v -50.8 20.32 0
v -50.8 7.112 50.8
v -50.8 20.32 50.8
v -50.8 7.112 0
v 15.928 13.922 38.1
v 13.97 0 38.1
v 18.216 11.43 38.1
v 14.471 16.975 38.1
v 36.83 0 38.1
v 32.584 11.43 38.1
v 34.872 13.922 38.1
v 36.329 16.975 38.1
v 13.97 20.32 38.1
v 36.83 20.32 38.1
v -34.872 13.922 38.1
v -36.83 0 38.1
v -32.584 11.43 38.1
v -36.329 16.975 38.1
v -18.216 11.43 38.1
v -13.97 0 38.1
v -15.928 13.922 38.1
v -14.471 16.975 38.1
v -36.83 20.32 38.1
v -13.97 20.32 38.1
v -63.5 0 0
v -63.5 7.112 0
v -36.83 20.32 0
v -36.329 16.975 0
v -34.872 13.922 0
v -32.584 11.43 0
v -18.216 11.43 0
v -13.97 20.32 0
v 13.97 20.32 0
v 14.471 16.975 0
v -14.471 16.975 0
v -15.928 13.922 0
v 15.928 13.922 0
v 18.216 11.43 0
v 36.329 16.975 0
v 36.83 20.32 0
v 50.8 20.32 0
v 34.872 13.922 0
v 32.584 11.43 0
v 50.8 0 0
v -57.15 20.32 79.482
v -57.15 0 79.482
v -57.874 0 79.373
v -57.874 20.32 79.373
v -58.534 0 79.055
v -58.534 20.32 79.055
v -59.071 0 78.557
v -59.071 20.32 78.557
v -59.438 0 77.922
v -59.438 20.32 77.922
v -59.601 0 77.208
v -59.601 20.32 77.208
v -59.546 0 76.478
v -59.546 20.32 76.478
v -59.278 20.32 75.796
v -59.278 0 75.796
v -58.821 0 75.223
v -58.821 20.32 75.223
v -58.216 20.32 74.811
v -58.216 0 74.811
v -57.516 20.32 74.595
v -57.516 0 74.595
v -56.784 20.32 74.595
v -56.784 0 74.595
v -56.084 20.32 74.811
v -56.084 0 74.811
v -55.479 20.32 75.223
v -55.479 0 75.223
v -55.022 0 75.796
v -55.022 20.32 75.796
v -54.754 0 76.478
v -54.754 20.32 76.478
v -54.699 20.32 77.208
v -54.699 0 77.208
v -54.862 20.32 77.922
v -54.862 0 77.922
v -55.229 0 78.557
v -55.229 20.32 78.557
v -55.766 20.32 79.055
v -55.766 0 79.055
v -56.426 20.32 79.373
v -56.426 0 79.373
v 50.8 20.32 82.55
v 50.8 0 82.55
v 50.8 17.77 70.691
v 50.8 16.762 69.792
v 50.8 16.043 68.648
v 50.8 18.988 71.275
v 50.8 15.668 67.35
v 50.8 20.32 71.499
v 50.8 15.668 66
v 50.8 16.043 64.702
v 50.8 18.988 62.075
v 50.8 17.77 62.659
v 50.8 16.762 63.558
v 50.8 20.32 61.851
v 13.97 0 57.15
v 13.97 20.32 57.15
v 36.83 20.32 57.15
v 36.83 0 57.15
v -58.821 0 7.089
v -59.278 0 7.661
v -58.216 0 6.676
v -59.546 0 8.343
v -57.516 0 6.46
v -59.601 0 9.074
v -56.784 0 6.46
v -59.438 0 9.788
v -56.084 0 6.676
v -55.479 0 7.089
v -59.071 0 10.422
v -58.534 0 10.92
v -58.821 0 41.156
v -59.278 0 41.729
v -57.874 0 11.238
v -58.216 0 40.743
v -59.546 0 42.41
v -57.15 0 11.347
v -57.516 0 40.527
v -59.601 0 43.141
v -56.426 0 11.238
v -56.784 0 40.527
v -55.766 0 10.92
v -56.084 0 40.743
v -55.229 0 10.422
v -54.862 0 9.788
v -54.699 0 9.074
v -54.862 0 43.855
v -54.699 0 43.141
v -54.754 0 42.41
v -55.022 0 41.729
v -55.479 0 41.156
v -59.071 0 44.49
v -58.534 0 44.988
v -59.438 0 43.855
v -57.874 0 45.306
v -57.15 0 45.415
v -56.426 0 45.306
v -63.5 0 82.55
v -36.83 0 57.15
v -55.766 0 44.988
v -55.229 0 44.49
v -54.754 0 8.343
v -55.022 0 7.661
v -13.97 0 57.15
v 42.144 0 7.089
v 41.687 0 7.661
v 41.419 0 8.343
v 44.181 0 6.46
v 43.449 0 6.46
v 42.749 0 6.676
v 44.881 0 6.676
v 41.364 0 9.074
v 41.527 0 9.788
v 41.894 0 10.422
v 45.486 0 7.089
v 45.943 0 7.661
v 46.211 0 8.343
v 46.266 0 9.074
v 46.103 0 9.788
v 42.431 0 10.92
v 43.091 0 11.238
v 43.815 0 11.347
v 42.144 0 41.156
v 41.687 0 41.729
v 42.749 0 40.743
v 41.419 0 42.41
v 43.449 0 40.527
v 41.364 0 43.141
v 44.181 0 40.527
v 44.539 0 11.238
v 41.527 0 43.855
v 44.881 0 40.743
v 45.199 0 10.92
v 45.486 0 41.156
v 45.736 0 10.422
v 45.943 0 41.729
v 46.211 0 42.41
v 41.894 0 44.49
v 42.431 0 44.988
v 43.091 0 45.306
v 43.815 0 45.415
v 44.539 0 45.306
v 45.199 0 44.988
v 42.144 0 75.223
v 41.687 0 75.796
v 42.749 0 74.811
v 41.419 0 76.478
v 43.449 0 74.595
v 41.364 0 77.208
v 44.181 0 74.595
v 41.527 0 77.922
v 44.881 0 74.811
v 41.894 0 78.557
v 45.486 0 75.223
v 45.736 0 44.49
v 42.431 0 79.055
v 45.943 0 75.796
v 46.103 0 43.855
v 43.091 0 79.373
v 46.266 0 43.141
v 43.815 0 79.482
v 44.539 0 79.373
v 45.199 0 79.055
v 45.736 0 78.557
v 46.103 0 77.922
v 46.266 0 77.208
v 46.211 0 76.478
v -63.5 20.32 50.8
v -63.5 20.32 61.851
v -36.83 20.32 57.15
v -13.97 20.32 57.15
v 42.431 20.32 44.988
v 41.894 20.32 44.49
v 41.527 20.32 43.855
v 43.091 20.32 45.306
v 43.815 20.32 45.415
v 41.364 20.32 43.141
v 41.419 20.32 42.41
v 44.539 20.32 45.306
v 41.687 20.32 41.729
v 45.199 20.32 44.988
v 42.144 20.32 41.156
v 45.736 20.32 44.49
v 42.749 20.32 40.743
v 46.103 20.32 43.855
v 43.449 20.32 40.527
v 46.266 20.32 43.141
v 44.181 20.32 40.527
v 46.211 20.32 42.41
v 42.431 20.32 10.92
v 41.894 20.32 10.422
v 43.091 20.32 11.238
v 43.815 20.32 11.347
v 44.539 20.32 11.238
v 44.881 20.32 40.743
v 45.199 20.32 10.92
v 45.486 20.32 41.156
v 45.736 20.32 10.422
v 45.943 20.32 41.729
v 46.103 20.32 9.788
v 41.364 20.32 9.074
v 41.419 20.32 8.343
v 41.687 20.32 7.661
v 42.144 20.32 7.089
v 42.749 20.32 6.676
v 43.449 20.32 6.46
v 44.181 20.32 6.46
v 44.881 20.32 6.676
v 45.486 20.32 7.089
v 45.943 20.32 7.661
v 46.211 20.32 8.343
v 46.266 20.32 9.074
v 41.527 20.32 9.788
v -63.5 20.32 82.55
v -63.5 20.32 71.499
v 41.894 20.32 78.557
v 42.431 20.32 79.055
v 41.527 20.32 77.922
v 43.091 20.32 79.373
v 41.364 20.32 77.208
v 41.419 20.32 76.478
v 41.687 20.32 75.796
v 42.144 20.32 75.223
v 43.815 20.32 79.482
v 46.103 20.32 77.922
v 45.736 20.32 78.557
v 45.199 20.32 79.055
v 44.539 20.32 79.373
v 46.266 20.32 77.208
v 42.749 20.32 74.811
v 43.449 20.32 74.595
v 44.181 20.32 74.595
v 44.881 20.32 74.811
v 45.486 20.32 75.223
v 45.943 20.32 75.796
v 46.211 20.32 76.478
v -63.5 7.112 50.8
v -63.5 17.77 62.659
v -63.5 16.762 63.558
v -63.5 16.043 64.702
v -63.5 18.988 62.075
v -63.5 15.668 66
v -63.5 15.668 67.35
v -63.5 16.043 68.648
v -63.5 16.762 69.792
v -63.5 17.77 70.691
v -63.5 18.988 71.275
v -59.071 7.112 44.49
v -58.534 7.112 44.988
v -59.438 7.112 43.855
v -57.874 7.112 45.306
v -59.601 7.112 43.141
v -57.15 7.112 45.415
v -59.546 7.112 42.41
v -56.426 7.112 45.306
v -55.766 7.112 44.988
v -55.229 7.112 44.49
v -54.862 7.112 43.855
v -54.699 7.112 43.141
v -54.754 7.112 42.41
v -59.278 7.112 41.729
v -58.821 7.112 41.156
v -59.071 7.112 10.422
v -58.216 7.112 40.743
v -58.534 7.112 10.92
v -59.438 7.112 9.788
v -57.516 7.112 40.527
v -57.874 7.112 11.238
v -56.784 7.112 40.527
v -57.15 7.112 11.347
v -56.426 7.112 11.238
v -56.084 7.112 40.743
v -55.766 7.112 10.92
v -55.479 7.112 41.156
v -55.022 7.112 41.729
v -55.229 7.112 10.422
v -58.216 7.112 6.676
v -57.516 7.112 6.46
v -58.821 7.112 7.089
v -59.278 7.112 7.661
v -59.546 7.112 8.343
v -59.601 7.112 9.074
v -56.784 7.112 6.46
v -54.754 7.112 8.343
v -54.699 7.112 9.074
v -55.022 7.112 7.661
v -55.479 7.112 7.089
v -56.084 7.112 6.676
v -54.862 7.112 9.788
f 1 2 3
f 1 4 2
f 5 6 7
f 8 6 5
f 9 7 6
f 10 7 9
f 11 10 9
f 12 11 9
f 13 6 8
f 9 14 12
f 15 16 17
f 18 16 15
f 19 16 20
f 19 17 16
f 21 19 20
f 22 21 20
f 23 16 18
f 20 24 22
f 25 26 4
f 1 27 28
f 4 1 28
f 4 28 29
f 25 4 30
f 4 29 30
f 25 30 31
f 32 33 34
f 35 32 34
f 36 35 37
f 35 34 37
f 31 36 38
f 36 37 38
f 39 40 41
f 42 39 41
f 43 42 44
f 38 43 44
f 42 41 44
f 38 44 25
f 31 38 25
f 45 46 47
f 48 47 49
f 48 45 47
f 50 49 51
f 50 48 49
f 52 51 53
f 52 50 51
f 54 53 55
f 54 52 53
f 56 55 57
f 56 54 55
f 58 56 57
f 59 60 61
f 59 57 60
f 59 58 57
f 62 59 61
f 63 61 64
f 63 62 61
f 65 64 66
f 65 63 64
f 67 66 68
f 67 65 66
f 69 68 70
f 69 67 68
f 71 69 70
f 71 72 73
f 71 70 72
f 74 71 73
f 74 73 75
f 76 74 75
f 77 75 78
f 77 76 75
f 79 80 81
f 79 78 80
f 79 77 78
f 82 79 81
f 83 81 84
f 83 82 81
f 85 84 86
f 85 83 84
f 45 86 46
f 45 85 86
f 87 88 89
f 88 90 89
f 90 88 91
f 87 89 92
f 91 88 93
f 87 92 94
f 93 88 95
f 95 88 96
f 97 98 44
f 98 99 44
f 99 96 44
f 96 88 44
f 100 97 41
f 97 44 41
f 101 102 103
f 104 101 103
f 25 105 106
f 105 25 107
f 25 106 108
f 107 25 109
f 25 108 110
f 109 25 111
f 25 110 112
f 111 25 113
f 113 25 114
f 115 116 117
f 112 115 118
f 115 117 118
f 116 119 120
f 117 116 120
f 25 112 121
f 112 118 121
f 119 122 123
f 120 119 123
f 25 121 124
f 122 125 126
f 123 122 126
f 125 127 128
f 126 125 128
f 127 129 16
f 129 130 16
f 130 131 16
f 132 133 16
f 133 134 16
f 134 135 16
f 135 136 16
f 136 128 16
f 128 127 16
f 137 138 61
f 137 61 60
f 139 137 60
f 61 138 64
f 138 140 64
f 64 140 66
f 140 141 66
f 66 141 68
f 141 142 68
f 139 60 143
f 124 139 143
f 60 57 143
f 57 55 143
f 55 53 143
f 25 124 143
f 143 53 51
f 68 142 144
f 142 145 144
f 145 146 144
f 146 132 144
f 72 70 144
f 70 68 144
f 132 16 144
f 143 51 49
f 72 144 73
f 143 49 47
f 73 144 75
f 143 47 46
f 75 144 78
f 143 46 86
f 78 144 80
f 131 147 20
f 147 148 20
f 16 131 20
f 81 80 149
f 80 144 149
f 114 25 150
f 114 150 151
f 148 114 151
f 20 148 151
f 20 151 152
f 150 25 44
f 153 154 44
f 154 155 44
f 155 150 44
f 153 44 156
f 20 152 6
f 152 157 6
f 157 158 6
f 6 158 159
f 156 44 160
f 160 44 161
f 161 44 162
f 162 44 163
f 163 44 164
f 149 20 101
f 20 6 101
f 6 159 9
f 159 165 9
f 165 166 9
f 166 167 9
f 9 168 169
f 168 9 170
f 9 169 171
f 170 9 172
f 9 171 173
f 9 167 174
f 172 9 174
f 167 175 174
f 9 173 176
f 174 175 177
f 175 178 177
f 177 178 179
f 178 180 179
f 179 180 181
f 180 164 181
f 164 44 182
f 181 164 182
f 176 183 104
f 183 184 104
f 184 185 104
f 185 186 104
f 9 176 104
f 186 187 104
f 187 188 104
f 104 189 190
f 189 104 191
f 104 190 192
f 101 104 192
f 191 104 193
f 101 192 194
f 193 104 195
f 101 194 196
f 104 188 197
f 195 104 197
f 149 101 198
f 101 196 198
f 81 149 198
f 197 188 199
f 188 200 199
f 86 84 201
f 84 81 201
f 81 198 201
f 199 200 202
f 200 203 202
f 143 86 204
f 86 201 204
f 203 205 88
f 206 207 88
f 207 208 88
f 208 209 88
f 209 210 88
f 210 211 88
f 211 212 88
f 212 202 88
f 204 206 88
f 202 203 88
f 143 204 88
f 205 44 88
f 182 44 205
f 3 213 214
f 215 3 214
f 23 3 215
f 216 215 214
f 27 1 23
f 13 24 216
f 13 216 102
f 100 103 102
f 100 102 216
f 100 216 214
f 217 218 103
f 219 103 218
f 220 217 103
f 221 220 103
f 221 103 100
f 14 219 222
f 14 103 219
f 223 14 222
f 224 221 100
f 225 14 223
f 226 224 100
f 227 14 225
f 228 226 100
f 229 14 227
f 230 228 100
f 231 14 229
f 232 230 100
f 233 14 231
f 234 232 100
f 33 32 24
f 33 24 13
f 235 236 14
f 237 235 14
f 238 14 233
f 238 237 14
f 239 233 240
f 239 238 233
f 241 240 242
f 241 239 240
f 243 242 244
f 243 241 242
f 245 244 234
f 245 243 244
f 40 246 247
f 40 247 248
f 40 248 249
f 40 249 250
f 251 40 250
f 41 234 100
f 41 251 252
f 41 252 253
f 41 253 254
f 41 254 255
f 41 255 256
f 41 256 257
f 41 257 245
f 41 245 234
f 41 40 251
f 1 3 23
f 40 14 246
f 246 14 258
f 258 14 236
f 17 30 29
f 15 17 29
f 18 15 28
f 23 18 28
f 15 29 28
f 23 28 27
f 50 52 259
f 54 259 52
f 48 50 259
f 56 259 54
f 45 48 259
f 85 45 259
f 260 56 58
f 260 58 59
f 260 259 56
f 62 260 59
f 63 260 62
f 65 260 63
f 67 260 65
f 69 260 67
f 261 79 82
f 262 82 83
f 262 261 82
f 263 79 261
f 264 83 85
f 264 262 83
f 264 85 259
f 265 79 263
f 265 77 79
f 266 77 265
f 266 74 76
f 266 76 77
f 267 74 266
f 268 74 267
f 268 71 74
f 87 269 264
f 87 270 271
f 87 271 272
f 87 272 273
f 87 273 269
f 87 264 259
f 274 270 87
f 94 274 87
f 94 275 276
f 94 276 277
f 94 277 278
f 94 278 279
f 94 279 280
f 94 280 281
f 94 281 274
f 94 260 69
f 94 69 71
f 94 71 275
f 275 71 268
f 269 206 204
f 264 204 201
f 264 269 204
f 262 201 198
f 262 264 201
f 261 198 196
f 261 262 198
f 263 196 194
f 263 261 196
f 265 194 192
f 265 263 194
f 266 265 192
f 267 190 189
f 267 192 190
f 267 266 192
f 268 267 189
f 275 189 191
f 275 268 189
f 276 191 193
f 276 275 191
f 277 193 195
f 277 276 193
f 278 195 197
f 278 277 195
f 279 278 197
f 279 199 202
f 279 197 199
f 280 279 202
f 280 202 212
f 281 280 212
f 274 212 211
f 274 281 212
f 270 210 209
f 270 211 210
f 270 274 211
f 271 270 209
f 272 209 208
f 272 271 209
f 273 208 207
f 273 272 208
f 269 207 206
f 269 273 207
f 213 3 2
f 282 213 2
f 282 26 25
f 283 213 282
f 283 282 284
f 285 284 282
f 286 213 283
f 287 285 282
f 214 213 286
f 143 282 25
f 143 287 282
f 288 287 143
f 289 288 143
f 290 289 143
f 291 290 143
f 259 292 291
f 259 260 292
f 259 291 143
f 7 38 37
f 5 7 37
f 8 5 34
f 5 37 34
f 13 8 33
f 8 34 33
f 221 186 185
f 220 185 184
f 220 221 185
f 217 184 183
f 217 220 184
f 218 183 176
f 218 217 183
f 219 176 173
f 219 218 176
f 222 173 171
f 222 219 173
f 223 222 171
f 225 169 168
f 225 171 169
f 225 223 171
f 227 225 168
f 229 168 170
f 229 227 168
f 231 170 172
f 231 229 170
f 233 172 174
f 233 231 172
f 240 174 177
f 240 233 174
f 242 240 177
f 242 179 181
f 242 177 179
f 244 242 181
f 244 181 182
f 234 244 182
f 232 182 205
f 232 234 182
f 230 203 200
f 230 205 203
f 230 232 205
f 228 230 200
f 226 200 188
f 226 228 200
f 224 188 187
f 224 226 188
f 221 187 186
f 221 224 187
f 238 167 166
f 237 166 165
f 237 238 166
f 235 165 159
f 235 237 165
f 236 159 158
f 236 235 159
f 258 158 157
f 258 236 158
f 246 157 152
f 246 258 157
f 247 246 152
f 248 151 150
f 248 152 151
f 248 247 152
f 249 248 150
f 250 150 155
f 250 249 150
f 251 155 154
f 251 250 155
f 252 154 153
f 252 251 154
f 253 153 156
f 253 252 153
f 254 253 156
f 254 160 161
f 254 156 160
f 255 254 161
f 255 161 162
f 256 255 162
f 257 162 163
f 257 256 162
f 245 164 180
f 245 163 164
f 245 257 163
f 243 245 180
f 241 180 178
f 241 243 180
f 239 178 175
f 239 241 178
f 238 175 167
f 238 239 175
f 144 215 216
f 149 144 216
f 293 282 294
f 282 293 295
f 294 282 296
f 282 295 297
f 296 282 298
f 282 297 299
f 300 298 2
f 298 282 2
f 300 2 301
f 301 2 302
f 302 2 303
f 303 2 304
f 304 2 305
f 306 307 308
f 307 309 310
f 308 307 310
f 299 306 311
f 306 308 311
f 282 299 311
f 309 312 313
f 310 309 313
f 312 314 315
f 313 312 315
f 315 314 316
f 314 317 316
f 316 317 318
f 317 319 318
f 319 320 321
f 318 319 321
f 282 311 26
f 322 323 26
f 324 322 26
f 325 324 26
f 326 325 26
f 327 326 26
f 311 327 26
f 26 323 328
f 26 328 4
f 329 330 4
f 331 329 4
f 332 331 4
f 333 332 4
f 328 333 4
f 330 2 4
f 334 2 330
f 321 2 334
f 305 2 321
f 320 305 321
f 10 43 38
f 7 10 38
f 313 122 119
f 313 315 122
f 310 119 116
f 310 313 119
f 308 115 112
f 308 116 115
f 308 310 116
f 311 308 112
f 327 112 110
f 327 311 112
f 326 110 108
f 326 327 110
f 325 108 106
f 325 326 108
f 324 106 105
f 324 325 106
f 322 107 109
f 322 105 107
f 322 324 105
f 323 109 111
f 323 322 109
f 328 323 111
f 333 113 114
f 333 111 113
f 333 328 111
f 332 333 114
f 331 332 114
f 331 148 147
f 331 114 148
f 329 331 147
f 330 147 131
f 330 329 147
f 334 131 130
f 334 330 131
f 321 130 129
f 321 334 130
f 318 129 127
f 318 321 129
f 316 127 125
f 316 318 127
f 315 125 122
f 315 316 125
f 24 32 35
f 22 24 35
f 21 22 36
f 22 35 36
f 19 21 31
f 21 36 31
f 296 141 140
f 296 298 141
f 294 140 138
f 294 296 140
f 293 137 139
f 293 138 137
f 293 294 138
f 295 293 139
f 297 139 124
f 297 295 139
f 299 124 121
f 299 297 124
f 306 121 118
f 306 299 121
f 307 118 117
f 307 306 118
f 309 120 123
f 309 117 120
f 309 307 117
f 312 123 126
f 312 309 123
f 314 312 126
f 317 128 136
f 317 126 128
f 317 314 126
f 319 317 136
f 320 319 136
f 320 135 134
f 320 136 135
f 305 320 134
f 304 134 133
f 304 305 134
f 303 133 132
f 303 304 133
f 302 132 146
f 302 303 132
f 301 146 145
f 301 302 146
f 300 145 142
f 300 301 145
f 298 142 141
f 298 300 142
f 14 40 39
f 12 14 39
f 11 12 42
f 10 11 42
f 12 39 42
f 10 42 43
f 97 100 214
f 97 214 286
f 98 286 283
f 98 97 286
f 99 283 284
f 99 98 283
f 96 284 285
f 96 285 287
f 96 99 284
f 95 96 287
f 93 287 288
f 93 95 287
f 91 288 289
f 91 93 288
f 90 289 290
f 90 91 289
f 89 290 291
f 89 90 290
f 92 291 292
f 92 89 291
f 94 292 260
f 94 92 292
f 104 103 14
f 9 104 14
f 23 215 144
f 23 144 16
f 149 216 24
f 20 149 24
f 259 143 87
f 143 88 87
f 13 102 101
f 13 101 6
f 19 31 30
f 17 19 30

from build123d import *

# Parameters (mm, degrees)
BOSS_EXTRUDE1_DEPTH  = 38.1
SKETCH7_W            = 101.6
SKETCH7_H            = 20.32
BOSS_EXTRUDE2_DEPTH  = 44.45
BOSS_EXTRUDE9_DEPTH  = 12.7
SKETCH8_W            = 22.86
SKETCH8_H            = 19.05
CUT_EXTRUDE1_DEPTH   = 20.32
CUT_EXTRUDE2_START   = -101.6
SKETCH9_R            = 4.826
CUT_EXTRUDE2_DEPTH   = 114.3
LPATTERN1_COUNT      = 3
LPATTERN1_PITCH      = 34.067332164
LPATTERN1_COUNT_DIR2 = 2
LPATTERN1_PITCH_DIR2 = 100.965


with BuildPart() as part:
    # Sketch1 → Boss-Extrude1 (new body)
    with BuildSketch(Plane.XY):
        with BuildLine():
            Line((-50.8, 0), (50.8, 0))
            Line((50.8, 0), (50.8, 20.32))
            Line((50.8, 20.32), (36.83, 20.32))
            ThreePointArc((36.83, 20.32), (35.714076836, 15.394076836), (32.584204897, 11.43))
            Line((32.584204897, 11.43), (18.215795103, 11.43))
            ThreePointArc((18.215795103, 11.43), (15.085923164, 15.394076836), (13.97, 20.32))
            Line((13.97, 20.32), (-13.97, 20.32))
            ThreePointArc((-13.97, 20.32), (-15.085923164, 15.394076836), (-18.215795103, 11.43))
            Line((-18.215795103, 11.43), (-32.584204897, 11.43))
            ThreePointArc((-32.584204897, 11.43), (-35.714076836, 15.394076836), (-36.83, 20.32))
            Line((-36.83, 20.32), (-50.8, 20.32))
            Line((-50.8, 20.32), (-50.8, 0))
        make_face()
    extrude(amount=BOSS_EXTRUDE1_DEPTH)

    # Sketch7 → Boss-Extrude2 (add)
    with BuildSketch(Plane.XY.offset(38.1)):
        with Locations((0, 10.16)):
            Rectangle(SKETCH7_W, SKETCH7_H)
    extrude(amount=BOSS_EXTRUDE2_DEPTH)

    # Sketch21 → Boss-Extrude9 (add)
    with BuildSketch(Plane.ZY.offset(50.8)):
        Polygon((0, 7.112), (0, 0), (68.41445042, 0), (82.55, 0), (82.55, 7.153488119), (82.55, 20.32), (50.8, 20.32), (50.8, 7.112), align=None)
    extrude(amount=BOSS_EXTRUDE9_DEPTH)

    # Sketch8 → Cut-Extrude1 (cut)
    with BuildSketch(Plane(origin=(0, 20.32, 0), x_dir=(1, 0, 0), z_dir=(0, 1, 0))):
        with Locations((-25.4, -47.625)):
            Rectangle(SKETCH8_W, SKETCH8_H)
        with Locations((25.4, -47.625)):
            Rectangle(SKETCH8_W, SKETCH8_H)
    extrude(amount=-CUT_EXTRUDE1_DEPTH, mode=Mode.SUBTRACT)

    # Sketch5 → #10 (0.1935) Diameter Hole1 (revolve, cut)
    with BuildSketch(Plane(origin=(-57.15, 20.32, 8.89), x_dir=(0, 0, 1), z_dir=(1, 0, 0))):
        Polygon((0, 0), (0, 25.4), (2.45745, 23.923415072), (2.45745, 0), align=None)
    f_10_0_1935_diameter_hole1 = revolve(axis=Axis((-57.15, 26.67, 8.89), (0, -1, 0)), mode=Mode.SUBTRACT)

    # Sketch9 → Cut-Extrude2 (cut)
    with BuildSketch(Plane.ZY.offset(50.8).offset(CUT_EXTRUDE2_START)):
        with Locations((66.675, 20.447)):
            Circle(SKETCH9_R)
    extrude(amount=CUT_EXTRUDE2_DEPTH, mode=Mode.SUBTRACT)

    # LPattern1: 10 _0.1935_ Diameter Hole1 3 × 2
    with Locations(*[(j * LPATTERN1_PITCH_DIR2, 0, i * LPATTERN1_PITCH) for i in range(LPATTERN1_COUNT) for j in range(LPATTERN1_COUNT_DIR2) if (i, j) != (0, 0)]):
        add(f_10_0_1935_diameter_hole1, mode=Mode.SUBTRACT)


solid = part.part
